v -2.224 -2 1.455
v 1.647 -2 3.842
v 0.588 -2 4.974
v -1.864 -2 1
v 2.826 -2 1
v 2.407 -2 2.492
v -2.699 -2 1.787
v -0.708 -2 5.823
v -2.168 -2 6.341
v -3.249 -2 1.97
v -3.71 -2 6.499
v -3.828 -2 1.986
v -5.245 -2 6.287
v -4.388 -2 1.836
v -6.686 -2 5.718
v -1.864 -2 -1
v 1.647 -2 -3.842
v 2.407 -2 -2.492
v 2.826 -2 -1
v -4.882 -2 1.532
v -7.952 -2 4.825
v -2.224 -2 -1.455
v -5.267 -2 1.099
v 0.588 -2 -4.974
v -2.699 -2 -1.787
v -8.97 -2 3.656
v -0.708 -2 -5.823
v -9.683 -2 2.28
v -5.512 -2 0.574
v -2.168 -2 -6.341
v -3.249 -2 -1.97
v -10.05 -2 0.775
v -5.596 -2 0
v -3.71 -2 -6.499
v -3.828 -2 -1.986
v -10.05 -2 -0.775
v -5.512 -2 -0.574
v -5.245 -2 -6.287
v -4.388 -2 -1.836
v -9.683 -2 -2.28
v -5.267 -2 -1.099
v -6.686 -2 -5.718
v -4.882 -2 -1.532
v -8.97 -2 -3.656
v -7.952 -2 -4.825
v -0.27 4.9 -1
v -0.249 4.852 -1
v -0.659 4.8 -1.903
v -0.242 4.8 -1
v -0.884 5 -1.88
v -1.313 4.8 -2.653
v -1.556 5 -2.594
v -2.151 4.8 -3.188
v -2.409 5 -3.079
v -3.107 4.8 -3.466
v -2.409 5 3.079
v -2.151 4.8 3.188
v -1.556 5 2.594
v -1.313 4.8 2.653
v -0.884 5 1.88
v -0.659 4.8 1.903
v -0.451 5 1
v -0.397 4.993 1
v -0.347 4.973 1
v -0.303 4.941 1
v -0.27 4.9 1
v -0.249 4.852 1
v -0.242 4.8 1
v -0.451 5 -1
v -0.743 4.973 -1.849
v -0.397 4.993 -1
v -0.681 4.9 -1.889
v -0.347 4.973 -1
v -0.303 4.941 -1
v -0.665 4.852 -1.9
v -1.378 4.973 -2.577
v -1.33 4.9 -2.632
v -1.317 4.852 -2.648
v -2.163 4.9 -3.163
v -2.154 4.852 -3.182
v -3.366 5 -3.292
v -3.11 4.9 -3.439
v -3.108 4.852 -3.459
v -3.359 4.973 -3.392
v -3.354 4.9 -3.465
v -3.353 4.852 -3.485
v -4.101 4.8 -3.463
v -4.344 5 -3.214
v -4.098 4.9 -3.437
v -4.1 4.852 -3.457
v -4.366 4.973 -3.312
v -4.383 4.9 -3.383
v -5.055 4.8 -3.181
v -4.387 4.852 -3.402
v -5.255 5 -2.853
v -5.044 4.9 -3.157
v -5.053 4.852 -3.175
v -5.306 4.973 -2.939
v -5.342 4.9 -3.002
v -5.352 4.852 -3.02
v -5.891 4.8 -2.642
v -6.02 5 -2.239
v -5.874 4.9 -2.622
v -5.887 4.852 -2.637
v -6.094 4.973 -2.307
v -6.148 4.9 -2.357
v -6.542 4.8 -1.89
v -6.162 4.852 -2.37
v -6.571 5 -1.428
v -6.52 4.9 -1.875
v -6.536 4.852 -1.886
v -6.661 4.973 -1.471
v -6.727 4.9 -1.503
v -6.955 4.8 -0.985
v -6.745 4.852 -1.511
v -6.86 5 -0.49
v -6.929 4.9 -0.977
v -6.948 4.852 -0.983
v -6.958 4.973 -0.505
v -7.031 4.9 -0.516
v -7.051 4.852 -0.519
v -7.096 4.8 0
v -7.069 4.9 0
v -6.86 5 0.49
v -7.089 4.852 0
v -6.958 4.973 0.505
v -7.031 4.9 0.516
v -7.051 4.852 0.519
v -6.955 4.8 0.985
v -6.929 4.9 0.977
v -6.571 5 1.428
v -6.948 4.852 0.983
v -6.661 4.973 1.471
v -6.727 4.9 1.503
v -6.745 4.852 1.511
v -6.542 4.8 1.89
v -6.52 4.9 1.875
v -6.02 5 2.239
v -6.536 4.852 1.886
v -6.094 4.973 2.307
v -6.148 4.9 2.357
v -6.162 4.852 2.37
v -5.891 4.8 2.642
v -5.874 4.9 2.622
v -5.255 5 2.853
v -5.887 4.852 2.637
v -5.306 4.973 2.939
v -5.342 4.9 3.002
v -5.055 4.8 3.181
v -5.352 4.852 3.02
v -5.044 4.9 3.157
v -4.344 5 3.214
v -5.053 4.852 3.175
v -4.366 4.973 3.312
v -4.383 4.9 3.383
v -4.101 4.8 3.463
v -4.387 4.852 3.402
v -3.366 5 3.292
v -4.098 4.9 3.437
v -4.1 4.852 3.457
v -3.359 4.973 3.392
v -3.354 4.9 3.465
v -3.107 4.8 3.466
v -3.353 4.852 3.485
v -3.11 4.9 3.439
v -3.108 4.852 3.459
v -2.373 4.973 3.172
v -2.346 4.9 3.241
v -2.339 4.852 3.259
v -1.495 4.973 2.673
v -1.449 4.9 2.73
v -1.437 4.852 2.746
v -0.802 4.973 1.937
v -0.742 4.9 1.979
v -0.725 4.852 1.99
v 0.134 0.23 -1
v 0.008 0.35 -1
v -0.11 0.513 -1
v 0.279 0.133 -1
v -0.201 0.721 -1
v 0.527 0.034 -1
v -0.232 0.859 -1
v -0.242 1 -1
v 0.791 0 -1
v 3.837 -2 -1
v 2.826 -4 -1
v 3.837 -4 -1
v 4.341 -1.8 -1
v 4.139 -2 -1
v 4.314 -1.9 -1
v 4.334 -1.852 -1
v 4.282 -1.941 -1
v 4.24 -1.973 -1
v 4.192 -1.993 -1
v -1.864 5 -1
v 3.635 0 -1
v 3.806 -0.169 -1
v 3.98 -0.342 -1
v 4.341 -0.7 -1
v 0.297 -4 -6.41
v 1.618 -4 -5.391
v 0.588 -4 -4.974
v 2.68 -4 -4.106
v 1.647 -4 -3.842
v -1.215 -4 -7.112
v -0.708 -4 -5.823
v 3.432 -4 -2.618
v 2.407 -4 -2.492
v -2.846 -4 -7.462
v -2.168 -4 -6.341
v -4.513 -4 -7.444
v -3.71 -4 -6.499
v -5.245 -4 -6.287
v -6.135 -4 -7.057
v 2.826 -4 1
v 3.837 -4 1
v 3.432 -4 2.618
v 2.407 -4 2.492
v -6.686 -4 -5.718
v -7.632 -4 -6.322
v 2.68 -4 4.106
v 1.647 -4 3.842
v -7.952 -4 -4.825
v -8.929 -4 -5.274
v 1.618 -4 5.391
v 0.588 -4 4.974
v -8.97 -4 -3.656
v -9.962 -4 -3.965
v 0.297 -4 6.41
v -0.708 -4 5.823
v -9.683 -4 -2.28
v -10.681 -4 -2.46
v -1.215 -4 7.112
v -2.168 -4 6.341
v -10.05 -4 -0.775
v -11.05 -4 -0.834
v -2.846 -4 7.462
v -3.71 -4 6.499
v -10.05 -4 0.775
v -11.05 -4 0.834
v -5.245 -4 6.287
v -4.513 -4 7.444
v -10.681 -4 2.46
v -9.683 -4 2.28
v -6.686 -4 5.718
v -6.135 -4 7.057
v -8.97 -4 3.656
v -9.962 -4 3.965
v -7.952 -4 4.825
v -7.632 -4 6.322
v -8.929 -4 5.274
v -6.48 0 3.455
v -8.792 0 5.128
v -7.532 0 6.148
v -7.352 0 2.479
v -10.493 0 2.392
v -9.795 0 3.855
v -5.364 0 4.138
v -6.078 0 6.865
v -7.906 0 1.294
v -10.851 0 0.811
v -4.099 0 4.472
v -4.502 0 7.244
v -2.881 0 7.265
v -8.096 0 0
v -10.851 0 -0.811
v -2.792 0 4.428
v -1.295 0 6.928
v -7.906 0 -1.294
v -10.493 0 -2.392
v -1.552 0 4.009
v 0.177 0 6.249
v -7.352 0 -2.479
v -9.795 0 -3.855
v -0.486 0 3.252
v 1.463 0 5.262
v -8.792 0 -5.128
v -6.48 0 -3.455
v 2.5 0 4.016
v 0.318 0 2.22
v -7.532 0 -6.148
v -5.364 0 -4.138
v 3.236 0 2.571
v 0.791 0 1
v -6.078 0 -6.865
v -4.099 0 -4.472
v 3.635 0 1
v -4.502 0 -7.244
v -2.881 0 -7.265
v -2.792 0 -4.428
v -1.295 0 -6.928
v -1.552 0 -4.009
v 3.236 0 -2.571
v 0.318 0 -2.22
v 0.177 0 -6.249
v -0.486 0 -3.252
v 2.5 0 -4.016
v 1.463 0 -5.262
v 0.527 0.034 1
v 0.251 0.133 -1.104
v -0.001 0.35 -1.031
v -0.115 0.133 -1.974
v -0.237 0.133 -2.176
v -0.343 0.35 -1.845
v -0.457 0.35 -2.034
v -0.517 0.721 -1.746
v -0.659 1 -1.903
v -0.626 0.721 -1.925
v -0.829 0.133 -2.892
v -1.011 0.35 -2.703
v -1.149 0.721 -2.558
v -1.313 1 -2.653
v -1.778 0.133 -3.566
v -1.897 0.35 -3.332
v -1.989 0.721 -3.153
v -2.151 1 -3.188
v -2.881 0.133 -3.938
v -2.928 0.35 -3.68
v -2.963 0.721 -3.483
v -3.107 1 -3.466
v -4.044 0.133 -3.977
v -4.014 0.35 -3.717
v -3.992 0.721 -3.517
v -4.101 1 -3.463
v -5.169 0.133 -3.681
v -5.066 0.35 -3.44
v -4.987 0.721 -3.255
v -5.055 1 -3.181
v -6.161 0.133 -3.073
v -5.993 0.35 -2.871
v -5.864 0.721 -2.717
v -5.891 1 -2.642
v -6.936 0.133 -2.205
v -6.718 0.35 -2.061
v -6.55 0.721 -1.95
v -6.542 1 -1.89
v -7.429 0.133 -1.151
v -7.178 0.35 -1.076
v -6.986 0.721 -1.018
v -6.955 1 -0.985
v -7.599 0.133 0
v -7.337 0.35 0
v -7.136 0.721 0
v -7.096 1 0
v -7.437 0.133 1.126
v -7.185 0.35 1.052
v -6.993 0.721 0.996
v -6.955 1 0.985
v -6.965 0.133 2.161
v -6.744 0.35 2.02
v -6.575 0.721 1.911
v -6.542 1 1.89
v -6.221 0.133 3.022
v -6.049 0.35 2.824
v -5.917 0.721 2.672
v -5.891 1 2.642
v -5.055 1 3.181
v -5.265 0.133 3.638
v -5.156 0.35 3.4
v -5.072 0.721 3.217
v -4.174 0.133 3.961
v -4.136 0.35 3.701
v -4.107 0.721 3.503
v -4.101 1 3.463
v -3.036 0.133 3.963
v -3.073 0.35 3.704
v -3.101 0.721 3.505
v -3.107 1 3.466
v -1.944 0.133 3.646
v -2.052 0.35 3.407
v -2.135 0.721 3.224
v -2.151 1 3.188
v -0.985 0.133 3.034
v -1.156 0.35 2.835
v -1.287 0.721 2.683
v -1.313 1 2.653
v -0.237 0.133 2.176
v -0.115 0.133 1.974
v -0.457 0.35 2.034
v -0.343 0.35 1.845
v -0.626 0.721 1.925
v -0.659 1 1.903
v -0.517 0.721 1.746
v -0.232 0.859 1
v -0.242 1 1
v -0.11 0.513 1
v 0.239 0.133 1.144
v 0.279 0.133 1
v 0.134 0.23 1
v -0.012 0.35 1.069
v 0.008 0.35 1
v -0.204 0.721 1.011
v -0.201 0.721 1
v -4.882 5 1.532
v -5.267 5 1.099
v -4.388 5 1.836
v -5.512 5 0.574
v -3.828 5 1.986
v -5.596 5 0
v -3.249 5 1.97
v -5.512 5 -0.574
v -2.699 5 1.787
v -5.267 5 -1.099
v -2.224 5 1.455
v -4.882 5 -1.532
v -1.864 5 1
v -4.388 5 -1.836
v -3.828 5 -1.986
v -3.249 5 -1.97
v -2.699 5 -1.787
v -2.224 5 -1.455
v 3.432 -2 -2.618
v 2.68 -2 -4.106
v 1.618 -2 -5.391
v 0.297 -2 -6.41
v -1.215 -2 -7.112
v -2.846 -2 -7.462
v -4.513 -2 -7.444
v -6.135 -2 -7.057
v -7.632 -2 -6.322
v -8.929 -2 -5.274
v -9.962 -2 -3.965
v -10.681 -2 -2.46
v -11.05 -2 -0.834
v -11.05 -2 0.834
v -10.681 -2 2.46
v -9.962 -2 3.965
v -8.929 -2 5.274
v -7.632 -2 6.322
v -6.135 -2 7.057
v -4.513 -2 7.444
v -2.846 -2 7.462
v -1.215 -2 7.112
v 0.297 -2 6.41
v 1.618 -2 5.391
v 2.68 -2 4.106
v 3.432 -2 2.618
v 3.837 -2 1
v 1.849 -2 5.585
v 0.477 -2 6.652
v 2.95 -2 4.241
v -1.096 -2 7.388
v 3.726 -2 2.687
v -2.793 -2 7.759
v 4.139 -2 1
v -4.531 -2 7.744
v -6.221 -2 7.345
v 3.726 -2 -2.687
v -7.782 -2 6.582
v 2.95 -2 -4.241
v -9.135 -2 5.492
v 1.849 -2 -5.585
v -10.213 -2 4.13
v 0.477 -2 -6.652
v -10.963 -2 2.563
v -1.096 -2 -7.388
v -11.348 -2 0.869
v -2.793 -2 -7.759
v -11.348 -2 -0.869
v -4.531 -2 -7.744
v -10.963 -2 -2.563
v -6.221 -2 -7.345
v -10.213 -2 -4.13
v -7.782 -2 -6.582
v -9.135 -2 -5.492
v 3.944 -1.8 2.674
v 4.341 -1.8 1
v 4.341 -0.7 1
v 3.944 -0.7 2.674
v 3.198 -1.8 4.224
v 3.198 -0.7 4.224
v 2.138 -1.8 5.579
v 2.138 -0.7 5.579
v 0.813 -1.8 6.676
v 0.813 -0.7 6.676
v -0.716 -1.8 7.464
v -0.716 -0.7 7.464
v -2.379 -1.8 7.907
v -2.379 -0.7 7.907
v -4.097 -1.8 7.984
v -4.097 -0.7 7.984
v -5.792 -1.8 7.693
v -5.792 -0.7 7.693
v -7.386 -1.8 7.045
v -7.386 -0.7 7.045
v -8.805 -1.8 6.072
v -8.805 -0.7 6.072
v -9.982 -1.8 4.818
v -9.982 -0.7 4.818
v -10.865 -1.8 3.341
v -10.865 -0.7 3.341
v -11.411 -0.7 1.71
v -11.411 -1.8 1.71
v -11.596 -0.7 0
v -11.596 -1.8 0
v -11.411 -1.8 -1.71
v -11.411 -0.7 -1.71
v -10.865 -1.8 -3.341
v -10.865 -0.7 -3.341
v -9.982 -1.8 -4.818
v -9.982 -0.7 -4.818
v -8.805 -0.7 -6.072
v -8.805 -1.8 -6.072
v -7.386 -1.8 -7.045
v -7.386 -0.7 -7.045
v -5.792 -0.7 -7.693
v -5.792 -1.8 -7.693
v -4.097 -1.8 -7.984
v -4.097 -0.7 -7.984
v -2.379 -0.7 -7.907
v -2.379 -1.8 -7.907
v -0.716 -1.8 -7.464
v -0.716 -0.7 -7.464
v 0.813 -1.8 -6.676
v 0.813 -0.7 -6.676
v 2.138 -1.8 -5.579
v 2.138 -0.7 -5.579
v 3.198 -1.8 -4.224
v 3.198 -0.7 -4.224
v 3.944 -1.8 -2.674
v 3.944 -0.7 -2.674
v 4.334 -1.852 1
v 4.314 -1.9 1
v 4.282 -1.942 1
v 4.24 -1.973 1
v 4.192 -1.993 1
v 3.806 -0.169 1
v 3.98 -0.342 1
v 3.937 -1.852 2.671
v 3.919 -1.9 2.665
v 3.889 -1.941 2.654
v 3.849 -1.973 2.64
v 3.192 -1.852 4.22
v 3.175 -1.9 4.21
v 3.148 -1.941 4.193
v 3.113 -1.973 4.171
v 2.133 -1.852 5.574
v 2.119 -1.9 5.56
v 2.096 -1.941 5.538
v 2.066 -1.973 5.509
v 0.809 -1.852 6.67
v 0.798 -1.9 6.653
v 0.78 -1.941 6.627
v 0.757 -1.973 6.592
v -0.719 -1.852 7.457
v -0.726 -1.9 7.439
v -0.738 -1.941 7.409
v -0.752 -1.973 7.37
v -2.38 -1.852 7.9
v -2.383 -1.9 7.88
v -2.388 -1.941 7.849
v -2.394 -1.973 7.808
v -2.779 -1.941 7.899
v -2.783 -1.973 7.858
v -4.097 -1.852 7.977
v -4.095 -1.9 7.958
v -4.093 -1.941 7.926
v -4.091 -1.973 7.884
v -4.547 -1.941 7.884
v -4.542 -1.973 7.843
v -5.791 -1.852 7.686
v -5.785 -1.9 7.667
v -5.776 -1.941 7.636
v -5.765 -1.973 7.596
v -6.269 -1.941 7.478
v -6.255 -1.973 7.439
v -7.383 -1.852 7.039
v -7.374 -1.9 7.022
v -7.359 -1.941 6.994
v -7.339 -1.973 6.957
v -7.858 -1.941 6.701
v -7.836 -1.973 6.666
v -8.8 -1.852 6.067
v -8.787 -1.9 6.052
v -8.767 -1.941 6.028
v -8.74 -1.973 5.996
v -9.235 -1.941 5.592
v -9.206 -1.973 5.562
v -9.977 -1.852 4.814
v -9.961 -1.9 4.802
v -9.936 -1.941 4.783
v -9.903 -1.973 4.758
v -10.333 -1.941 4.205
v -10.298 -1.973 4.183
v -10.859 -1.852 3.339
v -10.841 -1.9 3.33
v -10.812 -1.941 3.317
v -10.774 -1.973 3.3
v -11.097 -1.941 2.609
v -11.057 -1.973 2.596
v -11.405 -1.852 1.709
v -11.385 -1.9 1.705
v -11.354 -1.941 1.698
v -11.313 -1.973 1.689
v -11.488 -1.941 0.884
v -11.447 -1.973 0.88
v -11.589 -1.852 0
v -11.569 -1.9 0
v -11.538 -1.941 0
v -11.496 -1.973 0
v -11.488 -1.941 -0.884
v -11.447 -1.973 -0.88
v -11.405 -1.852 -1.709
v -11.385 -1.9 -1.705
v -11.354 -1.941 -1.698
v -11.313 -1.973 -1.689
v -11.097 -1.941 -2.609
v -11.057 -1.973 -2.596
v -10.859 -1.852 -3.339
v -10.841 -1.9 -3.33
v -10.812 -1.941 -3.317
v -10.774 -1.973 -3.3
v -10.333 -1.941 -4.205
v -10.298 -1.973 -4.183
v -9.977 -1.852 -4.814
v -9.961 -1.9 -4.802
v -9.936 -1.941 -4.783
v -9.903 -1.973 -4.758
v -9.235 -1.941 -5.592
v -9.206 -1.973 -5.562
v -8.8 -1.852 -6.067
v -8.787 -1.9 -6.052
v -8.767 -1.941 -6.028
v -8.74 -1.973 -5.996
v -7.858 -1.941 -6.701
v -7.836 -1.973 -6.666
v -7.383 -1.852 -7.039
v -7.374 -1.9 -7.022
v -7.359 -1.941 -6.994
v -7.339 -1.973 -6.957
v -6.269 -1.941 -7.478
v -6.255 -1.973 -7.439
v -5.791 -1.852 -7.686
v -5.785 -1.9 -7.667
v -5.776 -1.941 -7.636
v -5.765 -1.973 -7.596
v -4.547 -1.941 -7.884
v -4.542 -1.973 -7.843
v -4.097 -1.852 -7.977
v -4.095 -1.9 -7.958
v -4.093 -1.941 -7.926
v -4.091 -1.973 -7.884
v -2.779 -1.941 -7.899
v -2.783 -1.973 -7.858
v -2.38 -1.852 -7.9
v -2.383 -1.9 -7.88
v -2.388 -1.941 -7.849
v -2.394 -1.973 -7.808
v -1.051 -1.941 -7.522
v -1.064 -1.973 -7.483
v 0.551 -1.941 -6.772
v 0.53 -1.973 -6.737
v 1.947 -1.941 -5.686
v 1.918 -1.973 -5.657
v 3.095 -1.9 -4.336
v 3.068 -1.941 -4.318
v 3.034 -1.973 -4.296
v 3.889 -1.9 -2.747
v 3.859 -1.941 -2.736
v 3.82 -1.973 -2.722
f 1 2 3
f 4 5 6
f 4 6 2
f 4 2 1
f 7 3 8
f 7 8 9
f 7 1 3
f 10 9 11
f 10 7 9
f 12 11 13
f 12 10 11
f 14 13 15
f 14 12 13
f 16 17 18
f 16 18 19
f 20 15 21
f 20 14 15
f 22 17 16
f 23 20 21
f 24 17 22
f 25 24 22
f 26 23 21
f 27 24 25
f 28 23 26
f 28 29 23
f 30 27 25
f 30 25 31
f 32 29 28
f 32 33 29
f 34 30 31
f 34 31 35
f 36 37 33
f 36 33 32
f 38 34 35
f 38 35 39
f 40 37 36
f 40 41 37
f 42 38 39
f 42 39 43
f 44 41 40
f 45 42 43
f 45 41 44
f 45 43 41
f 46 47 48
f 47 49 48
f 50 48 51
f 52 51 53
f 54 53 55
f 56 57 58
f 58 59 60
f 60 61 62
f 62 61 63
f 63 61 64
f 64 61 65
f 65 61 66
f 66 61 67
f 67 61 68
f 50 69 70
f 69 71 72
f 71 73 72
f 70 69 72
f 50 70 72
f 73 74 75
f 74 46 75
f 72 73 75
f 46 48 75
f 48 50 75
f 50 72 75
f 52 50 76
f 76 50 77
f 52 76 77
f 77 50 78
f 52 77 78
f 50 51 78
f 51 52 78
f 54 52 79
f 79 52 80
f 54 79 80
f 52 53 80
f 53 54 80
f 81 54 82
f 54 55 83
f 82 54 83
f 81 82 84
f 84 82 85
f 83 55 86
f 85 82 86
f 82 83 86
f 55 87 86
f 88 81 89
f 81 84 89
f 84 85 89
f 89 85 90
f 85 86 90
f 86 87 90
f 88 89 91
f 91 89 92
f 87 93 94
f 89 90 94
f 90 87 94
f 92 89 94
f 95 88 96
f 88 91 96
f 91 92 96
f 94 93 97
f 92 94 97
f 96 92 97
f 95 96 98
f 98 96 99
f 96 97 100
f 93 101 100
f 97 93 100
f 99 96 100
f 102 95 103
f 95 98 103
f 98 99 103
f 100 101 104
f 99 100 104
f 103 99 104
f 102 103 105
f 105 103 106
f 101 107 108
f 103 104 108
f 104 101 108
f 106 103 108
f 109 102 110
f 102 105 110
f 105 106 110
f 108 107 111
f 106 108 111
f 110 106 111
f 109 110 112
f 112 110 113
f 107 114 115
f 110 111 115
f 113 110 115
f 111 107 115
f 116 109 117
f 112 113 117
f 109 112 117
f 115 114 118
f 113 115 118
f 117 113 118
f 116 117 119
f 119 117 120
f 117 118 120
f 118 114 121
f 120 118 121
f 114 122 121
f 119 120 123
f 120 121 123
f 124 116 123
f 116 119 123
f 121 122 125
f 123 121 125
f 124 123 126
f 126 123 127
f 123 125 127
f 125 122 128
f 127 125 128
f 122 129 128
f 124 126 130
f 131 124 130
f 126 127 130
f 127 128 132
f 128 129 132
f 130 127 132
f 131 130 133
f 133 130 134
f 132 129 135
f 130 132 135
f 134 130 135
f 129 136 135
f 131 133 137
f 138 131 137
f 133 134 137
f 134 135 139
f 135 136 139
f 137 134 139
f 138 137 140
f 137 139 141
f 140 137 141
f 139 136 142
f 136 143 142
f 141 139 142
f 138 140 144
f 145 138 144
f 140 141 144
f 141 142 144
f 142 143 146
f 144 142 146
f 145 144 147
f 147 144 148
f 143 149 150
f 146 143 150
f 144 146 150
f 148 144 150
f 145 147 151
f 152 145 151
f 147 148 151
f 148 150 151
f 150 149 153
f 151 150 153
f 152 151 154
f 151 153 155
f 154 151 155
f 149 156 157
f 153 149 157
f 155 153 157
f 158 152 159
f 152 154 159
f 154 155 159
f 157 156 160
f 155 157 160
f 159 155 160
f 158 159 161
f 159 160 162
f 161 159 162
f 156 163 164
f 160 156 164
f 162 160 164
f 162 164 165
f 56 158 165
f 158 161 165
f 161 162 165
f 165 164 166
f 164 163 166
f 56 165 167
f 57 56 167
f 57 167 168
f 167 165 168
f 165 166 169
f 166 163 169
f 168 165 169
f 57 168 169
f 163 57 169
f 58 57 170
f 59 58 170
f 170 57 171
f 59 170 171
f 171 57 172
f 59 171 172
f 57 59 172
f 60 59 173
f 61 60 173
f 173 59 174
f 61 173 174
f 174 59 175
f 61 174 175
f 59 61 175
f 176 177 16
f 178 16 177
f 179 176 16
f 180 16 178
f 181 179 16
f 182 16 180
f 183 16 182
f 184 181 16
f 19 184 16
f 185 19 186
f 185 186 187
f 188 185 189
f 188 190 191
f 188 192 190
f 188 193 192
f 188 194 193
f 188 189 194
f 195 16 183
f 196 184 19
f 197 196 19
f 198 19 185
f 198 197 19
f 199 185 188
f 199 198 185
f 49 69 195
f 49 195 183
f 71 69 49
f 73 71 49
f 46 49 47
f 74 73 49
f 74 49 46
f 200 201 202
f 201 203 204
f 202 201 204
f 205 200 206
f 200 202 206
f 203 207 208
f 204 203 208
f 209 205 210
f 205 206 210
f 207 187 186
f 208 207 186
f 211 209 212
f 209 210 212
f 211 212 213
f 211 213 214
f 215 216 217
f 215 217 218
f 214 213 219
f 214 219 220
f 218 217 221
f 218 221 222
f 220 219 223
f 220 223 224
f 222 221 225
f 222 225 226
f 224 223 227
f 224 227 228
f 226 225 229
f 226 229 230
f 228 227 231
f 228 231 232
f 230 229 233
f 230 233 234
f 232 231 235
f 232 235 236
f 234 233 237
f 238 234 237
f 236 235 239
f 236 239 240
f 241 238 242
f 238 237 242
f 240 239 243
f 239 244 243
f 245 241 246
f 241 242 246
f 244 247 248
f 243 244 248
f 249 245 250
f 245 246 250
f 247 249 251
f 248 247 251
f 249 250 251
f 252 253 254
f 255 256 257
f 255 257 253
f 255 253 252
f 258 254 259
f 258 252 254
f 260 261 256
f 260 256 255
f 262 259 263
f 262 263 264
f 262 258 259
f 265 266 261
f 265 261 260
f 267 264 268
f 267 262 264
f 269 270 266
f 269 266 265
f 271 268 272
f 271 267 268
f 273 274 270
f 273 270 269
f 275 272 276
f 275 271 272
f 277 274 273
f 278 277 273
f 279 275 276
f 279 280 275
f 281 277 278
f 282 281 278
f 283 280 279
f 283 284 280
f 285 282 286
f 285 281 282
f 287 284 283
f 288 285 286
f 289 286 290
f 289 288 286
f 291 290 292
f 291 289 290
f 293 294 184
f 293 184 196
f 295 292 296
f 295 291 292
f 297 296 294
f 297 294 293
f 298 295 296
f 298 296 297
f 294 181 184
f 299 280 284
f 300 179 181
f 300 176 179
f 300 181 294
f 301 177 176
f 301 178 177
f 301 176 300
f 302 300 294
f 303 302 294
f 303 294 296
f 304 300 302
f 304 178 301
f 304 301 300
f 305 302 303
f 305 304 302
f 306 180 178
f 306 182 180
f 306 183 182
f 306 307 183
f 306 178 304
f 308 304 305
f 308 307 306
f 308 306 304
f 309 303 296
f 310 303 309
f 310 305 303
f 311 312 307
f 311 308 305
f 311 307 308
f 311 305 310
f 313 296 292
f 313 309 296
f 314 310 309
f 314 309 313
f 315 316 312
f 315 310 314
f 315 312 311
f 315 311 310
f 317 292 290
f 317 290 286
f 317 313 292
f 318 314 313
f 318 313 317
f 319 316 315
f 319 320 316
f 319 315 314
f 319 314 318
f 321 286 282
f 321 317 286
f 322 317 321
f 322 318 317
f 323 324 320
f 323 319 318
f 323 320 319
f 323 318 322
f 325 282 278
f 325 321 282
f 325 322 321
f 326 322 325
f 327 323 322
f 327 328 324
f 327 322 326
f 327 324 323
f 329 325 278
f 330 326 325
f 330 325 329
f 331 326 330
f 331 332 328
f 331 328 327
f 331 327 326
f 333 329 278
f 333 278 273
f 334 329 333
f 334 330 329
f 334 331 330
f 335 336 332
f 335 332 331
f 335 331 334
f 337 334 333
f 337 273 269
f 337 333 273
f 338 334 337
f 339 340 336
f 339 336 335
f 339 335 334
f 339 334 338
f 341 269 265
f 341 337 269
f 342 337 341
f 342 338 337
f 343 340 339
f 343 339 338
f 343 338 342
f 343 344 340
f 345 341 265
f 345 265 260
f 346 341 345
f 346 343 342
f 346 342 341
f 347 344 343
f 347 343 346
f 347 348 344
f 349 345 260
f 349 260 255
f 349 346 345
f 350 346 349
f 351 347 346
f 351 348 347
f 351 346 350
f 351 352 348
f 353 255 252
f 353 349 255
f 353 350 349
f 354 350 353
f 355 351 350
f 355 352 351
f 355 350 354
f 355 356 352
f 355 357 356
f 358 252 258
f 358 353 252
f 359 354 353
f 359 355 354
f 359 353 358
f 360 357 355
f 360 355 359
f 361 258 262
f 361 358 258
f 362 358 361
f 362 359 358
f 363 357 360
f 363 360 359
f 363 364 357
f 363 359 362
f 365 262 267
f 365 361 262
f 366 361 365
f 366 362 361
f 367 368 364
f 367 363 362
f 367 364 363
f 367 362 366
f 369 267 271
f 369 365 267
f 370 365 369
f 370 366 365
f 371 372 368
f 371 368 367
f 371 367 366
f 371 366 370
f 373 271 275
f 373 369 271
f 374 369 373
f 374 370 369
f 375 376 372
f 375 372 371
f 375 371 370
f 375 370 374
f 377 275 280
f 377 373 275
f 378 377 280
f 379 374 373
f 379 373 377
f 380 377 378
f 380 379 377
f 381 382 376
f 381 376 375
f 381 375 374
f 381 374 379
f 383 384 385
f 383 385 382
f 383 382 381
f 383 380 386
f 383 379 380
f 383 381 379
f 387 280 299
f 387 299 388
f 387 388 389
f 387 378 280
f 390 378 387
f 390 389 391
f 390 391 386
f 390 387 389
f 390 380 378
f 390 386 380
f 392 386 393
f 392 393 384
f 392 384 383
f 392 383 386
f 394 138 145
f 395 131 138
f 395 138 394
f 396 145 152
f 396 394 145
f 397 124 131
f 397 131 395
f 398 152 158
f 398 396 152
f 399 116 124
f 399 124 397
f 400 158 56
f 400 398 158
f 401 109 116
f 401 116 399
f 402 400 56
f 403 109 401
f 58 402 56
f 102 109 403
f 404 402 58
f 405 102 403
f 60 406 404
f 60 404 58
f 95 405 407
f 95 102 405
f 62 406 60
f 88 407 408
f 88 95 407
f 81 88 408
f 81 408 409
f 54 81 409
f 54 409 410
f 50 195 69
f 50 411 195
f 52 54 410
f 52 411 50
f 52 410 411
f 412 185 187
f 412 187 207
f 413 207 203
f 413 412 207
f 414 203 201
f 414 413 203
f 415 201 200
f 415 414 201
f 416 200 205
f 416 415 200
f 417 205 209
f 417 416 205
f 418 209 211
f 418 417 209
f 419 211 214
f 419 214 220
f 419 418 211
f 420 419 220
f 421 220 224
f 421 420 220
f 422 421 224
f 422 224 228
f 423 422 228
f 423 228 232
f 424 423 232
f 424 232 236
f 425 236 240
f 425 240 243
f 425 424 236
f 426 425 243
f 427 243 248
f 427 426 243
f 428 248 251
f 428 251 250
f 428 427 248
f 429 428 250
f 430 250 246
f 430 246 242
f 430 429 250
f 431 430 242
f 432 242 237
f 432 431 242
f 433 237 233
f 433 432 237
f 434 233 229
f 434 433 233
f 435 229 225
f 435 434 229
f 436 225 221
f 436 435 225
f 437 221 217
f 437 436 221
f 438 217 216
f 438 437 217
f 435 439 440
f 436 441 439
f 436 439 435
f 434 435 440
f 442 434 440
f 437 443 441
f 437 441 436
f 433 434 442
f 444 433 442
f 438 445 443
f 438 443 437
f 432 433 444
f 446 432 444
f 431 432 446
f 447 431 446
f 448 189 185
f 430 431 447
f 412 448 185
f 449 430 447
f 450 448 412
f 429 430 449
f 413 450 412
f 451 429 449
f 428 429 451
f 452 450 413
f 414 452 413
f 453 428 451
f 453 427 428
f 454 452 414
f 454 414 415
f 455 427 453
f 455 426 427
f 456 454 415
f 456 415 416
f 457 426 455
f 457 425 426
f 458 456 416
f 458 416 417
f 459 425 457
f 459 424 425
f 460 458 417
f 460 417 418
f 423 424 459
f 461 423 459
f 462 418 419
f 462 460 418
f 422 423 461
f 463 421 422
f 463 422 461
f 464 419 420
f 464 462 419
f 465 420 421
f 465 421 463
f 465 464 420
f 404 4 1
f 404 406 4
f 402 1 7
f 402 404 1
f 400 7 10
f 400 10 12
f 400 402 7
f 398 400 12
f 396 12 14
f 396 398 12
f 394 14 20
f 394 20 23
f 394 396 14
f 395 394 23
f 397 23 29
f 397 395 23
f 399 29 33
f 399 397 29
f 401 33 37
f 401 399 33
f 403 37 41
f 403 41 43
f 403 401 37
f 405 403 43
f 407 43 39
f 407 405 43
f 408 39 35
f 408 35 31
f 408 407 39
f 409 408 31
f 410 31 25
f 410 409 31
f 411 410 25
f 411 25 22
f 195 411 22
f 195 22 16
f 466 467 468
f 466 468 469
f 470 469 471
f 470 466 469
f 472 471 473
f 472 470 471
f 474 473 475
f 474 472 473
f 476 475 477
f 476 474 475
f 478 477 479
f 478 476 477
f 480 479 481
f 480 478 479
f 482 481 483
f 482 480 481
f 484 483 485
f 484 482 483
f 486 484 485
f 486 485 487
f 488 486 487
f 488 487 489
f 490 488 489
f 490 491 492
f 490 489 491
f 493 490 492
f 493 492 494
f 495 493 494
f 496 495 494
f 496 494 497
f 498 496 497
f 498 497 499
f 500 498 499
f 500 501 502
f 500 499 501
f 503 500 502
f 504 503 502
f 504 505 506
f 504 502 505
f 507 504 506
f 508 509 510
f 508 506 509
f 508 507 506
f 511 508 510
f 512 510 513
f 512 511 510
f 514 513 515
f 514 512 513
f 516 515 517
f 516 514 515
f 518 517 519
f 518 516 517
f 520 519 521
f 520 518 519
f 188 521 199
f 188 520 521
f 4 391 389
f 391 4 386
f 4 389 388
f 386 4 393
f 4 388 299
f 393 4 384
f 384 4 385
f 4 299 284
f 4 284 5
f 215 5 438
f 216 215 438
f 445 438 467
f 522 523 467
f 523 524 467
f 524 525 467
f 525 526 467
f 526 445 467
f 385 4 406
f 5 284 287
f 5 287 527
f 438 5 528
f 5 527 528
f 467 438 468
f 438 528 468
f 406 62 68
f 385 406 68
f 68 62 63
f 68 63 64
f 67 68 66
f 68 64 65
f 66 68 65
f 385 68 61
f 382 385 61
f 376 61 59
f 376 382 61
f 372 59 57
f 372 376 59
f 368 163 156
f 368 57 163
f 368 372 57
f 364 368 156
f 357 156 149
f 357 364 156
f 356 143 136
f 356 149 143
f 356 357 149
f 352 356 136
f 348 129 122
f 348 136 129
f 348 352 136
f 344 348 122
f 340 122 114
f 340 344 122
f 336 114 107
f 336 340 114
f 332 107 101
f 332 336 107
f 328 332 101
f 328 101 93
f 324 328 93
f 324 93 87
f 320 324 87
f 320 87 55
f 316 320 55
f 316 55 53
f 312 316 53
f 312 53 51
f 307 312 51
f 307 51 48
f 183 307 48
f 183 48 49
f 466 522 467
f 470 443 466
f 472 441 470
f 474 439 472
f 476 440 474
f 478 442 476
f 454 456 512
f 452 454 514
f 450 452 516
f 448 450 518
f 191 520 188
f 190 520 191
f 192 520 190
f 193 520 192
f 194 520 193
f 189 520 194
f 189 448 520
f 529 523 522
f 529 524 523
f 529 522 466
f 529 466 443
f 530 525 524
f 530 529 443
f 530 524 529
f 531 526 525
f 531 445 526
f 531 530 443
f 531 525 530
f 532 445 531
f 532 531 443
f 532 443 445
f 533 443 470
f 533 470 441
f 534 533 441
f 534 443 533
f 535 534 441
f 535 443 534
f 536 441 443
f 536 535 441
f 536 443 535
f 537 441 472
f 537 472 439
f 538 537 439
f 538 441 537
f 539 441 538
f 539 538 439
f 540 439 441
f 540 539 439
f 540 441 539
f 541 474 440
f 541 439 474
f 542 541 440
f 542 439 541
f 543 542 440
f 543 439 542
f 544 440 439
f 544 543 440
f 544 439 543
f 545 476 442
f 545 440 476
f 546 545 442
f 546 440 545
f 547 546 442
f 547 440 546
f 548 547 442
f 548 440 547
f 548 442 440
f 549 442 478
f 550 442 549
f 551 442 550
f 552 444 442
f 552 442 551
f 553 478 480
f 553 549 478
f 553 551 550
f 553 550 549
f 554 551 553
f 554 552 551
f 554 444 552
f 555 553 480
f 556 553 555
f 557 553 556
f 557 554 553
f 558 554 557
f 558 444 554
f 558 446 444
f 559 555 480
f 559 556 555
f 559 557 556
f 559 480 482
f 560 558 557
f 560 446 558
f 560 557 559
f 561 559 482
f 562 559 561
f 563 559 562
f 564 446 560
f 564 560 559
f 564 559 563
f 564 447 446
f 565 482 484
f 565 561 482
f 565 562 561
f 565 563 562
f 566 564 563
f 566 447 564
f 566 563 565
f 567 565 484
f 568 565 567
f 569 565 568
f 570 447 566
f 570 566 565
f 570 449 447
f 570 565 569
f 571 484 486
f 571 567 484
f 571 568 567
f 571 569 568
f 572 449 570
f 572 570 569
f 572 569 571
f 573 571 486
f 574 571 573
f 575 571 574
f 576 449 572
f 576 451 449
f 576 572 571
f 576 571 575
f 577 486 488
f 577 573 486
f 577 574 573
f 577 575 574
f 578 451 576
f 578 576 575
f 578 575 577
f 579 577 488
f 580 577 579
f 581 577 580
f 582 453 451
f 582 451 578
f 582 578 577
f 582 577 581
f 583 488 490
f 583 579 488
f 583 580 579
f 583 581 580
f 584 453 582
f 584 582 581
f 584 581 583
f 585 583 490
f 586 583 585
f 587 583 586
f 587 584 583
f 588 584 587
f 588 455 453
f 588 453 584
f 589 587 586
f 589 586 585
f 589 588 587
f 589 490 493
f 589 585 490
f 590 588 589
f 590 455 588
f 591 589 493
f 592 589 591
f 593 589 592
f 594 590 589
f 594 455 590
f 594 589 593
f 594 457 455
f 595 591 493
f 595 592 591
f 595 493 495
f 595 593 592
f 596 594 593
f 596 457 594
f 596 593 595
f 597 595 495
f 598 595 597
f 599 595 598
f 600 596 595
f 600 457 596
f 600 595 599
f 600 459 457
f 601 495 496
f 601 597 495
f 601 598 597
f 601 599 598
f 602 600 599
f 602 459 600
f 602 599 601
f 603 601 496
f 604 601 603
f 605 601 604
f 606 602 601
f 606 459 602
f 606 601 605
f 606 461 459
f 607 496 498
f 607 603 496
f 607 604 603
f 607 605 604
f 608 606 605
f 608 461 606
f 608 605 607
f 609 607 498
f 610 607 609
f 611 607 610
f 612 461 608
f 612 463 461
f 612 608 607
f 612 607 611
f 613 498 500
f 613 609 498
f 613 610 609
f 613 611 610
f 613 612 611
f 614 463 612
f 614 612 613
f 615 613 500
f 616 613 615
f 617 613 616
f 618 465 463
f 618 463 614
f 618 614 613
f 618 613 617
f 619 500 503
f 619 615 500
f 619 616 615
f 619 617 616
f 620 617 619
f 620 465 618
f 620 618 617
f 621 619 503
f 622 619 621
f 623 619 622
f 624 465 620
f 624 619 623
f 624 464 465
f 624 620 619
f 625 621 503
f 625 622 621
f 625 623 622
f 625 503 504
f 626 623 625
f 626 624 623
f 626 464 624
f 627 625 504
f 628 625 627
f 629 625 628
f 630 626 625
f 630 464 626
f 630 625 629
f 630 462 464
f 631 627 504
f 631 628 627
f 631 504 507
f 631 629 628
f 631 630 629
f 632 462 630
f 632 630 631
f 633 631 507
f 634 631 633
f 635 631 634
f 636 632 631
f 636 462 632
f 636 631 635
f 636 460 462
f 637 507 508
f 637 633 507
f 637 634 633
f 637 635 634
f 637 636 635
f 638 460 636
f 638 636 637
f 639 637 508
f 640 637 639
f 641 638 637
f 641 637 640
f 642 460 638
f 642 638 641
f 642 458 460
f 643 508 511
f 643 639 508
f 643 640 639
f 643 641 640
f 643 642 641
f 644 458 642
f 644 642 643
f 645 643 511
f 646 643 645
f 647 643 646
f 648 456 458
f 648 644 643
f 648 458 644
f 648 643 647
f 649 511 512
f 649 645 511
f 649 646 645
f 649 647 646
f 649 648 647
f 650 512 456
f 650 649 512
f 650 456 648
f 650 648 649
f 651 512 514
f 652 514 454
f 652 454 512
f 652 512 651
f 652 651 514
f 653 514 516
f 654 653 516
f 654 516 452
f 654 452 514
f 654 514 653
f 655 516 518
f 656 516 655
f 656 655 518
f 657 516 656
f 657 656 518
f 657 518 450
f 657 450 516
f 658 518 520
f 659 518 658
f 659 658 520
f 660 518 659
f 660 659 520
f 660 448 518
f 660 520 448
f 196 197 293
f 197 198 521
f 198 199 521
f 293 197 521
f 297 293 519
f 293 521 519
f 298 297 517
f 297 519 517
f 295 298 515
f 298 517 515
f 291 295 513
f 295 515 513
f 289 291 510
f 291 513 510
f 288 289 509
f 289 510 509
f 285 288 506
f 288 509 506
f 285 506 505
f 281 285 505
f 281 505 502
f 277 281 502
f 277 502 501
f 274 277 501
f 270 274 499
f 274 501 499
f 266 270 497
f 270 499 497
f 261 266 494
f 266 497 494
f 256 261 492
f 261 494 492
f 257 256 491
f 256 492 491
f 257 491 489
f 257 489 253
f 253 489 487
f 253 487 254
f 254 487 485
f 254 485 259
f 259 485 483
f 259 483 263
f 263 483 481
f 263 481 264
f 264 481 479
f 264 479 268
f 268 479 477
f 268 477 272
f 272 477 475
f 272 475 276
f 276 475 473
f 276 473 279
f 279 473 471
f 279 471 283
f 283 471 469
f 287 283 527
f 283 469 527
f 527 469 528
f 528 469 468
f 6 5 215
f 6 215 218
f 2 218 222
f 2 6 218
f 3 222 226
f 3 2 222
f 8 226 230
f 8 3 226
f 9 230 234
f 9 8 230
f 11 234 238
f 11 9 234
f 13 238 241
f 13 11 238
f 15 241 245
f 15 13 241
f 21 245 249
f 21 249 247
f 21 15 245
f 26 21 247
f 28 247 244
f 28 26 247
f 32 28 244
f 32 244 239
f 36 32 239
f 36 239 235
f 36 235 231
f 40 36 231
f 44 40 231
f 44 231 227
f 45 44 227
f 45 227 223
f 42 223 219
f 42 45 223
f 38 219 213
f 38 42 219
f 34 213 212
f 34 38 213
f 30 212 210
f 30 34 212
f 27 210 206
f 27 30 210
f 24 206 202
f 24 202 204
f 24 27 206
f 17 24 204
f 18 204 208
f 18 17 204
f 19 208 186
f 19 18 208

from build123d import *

# Parameters (mm, degrees)
SKETCH_2_W          = 9.419019416
SKETCH_2_H          = 11.792672783
CUT_EXTRUDE_1_DEPTH = 1
FILLET_1_R          = 0.2
CHAMFER_1_SIZE      = 0.7
FILLET_2_R          = 0.2
FILLET_3_R          = 1
EXTRUDE_1_DEPTH     = 2


with BuildPart() as part:
    # 草图1 → 旋转1 (revolve)
    with BuildSketch(Plane.XY, mode=Mode.PRIVATE) as revolve_1_sk:
        Polygon((-1.596153846, 5), (-0.096153846, 5), (-0.096153846, 0), (4.403846154, 0), (4.403846154, -2), (-1.596153846, -2), align=None)
    revolve(revolve_1_sk.sketch.rotate(Axis((-3.596153846, 17.535042267, 0), (0, -1, 0)), 180), axis=Axis((-3.596153846, 17.535042267, 0), (0, -1, 0)))

    # 草图2 → 切除-拉伸1 (cut, symmetric)
    with BuildSketch(Plane.XY):
        with Locations((1.113355862, -0.208425672)):
            Rectangle(SKETCH_2_W, SKETCH_2_H)
    extrude(amount=CUT_EXTRUDE_1_DEPTH, both=True, mode=Mode.SUBTRACT)

    # 圆角1
    fillet_1_edges = [part.edges().sort_by_distance(p)[0] for p in [
        (-7.096153846, 5, 0),
    ]]
    fillet(fillet_1_edges, radius=FILLET_1_R)

    # 倒角1
    chamfer_1_edges = [part.edges().sort_by_distance(p)[0] for p in [
        (-11.596153846, 0, 0),
    ]]
    chamfer(chamfer_1_edges, length=CHAMFER_1_SIZE)

    # 圆角2
    fillet_2_edges = [part.edges().sort_by_distance(p)[0] for p in [
        (-11.596153846, -2, 0),
    ]]
    fillet(fillet_2_edges, radius=FILLET_2_R)

    # 圆角3
    fillet_3_edges = [part.edges().sort_by_distance(p)[0] for p in [
        (-7.096153846, 0, 0),
    ]]
    fillet(fillet_3_edges, radius=FILLET_3_R)

    # 草图3 → 凸台-拉伸1 (add)
    with BuildSketch(Plane.XZ.offset(2)):
        with BuildLine():
            Line((2.826462443, -1), (3.836880528, -1))
            ThreePointArc((3.836880528, -1), (-11.096153846, 0), (3.836880528, 1))
            Line((3.836880528, 1), (2.826462443, 1))
            ThreePointArc((2.826462443, 1), (-10.096153846, 0), (2.826462443, -1))
        make_face()
    extrude(amount=EXTRUDE_1_DEPTH)


solid = part.part
